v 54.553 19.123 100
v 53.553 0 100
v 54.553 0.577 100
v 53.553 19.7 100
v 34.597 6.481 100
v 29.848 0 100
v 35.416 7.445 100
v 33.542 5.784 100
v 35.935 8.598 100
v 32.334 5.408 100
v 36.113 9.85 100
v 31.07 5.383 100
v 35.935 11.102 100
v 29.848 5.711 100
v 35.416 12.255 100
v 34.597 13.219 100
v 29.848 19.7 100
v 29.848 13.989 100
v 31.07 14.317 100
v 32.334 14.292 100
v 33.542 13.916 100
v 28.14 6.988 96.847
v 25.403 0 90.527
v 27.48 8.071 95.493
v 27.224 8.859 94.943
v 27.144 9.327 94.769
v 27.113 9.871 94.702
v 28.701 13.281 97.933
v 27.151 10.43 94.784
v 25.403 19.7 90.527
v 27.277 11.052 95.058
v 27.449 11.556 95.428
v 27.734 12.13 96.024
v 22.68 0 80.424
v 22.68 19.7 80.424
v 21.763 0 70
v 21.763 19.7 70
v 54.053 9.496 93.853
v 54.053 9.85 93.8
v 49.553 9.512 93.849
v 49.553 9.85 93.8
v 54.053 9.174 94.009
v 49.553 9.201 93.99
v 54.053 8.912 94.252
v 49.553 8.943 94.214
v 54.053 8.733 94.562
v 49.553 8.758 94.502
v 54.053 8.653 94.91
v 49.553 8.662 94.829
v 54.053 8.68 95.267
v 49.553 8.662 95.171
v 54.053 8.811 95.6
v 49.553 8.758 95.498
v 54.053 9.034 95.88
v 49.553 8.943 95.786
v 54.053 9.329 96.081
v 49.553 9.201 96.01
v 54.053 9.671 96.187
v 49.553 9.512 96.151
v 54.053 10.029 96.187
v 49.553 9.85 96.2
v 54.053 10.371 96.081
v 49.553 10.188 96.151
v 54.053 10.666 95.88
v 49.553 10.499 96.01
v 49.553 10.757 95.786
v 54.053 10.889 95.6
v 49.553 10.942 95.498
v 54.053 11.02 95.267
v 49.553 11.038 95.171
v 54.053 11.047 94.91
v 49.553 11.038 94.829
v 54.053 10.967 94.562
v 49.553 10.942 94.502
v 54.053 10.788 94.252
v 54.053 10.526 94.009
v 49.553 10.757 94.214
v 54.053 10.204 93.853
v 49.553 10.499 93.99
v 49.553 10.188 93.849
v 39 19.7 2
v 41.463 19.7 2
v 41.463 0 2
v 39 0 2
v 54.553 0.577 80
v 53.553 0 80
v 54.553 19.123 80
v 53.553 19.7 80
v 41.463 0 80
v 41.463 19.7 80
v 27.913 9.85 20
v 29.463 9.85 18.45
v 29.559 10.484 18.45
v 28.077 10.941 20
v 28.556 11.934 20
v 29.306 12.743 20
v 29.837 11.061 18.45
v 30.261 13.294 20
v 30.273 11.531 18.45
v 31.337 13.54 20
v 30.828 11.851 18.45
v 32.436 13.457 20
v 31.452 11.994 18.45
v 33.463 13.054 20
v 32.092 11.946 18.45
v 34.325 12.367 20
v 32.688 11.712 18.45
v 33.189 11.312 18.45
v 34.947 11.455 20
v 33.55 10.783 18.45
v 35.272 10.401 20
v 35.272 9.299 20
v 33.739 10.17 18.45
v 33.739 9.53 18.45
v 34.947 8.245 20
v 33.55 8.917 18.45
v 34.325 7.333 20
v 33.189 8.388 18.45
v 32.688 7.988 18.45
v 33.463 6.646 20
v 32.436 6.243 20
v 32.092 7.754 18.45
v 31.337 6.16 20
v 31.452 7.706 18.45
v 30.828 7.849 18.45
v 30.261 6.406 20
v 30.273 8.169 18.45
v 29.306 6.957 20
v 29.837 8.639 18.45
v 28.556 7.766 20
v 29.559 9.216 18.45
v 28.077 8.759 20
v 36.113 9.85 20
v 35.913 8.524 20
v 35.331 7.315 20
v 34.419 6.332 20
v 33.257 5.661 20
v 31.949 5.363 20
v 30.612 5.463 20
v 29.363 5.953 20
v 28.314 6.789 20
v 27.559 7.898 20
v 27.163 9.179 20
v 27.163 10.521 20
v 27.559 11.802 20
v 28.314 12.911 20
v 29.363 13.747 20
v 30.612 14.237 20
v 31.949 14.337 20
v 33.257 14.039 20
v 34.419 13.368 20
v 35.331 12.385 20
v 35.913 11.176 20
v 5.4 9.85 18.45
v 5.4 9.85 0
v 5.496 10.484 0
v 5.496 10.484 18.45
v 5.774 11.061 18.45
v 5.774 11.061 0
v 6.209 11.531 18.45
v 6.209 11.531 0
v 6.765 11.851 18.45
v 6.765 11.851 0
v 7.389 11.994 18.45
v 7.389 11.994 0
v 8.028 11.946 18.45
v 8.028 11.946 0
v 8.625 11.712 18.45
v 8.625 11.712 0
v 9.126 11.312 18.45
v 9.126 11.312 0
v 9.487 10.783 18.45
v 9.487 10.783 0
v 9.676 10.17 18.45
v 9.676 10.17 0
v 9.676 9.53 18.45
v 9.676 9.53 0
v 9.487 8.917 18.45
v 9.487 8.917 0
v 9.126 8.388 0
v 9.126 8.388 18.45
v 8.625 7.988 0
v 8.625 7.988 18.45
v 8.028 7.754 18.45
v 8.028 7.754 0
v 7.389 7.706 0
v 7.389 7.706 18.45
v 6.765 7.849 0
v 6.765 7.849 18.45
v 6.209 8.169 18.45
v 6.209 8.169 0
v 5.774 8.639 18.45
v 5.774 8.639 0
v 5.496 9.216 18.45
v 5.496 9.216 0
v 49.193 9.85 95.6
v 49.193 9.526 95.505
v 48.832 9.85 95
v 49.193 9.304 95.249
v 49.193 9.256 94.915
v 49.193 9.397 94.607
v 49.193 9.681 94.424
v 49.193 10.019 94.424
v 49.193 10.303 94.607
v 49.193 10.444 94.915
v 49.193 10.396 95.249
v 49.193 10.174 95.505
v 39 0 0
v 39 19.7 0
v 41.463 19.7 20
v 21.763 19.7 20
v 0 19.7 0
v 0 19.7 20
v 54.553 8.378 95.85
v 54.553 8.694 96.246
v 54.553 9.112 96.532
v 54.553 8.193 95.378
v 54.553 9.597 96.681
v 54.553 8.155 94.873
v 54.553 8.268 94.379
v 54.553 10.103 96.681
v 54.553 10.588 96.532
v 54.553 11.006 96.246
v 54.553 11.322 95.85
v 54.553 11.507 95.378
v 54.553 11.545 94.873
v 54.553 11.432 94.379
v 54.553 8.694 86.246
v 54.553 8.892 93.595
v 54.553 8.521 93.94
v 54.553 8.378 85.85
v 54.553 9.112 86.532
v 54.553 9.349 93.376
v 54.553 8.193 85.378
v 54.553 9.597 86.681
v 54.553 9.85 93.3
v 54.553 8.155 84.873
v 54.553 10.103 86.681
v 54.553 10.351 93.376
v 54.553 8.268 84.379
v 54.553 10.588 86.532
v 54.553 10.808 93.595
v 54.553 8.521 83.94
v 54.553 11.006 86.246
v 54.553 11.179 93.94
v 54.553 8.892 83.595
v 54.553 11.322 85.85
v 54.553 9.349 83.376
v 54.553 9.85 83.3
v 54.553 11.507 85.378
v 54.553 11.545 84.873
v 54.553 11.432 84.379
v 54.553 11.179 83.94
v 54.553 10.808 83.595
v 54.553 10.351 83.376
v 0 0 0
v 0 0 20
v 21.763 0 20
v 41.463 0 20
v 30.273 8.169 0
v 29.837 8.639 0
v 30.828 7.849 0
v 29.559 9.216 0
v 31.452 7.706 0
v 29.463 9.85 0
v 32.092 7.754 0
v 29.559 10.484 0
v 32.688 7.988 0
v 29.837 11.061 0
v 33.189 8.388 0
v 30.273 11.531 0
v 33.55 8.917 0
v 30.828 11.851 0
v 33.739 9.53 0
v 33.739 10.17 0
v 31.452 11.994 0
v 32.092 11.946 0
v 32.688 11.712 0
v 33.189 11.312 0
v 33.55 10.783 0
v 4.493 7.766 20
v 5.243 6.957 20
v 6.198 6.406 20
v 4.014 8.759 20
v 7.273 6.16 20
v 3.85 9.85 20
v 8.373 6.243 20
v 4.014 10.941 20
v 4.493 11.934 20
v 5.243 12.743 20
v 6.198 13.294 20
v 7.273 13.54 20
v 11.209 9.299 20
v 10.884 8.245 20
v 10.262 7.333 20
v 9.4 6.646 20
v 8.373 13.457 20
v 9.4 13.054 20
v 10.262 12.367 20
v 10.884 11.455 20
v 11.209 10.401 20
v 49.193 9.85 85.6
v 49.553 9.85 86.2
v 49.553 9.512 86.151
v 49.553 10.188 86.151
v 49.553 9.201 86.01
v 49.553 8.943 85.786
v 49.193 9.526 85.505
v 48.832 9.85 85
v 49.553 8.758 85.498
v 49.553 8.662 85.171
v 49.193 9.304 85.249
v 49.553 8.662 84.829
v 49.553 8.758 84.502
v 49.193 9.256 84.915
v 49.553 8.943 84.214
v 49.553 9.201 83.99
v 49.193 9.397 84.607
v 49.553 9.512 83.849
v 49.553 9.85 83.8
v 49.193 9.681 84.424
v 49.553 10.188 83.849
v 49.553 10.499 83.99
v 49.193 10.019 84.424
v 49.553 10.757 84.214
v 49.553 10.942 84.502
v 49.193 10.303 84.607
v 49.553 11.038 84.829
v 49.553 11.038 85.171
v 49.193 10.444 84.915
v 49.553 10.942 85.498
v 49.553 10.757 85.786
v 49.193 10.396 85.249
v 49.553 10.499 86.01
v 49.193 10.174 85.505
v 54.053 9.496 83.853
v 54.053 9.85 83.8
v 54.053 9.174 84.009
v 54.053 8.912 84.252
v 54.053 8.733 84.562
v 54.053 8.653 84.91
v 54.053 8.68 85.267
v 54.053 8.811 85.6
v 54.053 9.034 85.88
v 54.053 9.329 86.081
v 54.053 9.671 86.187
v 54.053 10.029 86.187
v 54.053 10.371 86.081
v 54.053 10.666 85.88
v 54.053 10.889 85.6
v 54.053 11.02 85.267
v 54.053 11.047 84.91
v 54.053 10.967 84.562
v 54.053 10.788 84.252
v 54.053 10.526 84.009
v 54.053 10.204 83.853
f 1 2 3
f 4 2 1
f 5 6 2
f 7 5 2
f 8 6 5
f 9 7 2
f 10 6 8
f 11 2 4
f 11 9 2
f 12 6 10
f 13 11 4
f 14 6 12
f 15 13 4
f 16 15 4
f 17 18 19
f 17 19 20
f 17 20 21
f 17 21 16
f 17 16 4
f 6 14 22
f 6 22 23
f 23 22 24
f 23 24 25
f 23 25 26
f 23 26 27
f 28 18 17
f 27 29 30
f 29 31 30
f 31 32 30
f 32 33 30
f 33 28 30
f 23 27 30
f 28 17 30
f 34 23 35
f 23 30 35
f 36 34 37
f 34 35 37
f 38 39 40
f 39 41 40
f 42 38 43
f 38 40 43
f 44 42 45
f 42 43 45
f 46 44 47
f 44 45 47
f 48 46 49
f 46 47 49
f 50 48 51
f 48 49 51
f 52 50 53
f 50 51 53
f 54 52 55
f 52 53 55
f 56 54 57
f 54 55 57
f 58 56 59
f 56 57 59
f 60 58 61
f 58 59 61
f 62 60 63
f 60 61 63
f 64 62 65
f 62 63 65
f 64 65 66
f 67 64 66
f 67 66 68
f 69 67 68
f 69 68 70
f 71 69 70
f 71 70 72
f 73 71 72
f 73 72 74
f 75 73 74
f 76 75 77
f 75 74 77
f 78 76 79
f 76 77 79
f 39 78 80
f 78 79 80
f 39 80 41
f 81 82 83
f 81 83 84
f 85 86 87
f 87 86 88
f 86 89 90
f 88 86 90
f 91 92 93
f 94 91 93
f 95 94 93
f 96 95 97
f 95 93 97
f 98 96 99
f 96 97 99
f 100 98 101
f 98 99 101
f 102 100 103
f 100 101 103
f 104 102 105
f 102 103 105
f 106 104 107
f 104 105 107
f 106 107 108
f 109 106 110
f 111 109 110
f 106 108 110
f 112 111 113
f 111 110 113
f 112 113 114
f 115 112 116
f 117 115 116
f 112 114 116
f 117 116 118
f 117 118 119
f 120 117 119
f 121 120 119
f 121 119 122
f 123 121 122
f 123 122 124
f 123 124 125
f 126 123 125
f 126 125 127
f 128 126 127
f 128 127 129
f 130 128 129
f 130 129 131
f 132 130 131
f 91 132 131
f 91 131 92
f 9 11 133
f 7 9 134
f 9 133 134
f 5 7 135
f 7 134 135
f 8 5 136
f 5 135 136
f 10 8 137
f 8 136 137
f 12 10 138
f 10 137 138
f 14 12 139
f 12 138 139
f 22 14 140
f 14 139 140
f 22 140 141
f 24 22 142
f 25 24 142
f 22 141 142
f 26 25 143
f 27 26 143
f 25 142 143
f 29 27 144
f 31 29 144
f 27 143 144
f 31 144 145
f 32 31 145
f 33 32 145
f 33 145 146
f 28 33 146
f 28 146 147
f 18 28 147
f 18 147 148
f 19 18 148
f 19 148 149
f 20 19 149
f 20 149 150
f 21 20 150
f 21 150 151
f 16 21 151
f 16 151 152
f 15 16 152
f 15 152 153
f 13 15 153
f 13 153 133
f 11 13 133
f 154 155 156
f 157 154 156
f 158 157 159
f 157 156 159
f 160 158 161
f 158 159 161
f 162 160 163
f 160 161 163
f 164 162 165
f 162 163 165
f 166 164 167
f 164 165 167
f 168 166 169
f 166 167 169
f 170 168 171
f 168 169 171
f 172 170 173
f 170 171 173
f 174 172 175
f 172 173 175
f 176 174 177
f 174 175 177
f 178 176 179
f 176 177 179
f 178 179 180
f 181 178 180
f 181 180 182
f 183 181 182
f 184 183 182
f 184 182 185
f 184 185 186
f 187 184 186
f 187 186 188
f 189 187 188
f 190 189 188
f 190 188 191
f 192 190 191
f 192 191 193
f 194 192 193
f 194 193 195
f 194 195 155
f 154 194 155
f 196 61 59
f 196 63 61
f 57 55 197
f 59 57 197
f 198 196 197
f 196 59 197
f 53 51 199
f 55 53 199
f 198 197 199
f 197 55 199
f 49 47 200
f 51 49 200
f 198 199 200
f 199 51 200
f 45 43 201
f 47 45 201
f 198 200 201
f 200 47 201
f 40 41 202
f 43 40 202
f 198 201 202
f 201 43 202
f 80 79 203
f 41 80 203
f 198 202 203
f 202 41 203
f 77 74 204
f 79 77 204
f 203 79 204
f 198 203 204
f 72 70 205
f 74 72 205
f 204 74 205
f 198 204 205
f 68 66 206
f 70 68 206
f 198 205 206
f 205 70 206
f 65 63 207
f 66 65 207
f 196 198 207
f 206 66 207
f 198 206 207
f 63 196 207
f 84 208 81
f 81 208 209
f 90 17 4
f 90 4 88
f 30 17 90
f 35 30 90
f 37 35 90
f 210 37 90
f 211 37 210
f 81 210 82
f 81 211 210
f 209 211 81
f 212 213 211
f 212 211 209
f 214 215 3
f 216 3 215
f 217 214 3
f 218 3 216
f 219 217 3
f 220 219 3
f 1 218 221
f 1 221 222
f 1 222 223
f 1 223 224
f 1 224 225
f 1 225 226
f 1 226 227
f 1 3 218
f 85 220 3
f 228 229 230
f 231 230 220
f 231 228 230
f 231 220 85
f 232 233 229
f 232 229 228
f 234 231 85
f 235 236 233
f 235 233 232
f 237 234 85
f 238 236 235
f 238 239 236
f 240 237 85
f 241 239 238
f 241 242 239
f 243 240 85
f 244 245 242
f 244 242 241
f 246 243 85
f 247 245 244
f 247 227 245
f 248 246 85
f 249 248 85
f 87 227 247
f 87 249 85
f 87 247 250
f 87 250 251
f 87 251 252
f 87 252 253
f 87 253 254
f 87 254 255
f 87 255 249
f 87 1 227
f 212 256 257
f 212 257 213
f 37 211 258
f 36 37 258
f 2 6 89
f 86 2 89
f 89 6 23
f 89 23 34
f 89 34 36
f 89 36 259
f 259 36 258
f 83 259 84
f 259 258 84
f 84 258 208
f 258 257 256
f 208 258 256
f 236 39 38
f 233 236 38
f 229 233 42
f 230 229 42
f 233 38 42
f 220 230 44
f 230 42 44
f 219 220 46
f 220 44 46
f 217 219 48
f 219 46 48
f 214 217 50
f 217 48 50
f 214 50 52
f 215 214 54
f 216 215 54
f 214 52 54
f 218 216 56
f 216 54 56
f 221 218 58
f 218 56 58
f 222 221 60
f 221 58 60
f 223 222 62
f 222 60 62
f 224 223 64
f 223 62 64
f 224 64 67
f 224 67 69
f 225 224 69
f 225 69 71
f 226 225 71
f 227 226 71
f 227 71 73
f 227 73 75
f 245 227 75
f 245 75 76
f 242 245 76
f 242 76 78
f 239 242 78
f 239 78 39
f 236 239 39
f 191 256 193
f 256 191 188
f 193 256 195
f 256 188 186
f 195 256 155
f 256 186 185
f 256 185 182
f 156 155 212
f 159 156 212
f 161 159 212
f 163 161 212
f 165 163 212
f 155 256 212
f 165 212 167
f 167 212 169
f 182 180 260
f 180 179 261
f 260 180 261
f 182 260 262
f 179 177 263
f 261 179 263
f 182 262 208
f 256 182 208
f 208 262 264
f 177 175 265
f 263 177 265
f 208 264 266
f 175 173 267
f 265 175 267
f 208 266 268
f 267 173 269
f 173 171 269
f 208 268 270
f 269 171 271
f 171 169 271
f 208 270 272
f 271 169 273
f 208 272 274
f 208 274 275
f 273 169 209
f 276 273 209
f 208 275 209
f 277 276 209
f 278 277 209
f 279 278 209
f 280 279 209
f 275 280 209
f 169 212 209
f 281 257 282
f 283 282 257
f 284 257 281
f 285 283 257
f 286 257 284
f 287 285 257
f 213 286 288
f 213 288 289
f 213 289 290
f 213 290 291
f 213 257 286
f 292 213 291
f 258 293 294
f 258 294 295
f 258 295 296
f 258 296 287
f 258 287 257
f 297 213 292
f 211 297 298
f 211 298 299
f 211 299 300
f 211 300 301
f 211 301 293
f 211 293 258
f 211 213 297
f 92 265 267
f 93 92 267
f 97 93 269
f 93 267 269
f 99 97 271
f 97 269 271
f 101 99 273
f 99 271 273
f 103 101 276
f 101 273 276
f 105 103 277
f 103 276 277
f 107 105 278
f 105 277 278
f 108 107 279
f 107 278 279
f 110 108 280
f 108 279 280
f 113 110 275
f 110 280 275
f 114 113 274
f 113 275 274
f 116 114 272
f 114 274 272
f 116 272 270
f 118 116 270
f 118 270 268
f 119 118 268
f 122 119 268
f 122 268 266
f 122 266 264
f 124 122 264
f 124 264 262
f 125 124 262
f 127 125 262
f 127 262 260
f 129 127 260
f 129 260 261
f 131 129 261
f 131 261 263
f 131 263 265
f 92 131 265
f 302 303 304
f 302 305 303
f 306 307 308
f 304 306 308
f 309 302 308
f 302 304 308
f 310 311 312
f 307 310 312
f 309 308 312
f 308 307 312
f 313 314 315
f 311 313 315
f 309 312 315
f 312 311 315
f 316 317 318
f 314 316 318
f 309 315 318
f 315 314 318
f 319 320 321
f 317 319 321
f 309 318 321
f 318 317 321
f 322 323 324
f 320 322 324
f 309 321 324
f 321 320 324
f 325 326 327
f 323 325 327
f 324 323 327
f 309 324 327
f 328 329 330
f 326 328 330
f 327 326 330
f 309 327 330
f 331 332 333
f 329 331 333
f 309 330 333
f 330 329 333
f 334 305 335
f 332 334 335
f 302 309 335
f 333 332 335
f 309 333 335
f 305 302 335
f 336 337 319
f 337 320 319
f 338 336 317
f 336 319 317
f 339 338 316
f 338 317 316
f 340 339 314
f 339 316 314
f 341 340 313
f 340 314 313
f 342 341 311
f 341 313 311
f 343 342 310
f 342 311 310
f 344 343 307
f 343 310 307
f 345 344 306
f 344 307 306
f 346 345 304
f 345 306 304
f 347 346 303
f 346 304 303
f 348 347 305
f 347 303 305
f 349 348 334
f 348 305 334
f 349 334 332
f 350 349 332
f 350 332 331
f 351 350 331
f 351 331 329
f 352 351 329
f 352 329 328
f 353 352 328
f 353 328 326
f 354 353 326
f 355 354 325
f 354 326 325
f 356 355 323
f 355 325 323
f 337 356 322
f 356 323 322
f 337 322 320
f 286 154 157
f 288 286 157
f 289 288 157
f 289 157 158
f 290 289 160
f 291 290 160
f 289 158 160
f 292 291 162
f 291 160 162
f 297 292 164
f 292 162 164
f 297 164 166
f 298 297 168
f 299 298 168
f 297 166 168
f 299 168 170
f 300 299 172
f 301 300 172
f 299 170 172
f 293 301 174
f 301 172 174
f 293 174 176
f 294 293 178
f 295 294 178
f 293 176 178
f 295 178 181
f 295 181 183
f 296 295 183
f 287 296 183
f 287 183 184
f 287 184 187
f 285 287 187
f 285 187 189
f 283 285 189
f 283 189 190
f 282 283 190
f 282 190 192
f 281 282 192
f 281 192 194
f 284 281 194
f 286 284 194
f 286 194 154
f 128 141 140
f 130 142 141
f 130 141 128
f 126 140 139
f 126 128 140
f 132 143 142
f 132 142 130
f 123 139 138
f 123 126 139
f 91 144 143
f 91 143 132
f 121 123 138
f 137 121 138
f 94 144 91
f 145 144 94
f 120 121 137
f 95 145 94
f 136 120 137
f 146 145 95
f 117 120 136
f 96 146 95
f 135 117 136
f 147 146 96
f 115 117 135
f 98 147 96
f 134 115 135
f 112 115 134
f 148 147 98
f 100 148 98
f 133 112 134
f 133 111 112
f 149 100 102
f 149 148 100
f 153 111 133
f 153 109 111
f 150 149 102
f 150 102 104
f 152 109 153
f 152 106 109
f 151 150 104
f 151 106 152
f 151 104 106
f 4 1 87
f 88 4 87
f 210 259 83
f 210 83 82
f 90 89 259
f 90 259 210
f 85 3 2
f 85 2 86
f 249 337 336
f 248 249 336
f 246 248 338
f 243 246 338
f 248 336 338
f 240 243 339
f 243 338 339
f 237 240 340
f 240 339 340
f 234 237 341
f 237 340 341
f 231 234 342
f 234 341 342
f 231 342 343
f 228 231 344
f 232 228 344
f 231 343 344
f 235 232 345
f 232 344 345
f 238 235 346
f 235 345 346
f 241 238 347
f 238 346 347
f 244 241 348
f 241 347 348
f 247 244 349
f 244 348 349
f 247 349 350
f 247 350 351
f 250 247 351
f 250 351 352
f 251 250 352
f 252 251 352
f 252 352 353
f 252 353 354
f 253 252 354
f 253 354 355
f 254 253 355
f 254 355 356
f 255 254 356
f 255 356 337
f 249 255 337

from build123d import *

# Parameters (mm, degrees)
SCHIZZO1_W                             = 39
SCHIZZO1_H                             = 19.7
ESTRUSIONE_ESTRUSIONE1_DEPTH           = 20
FORO_SVASATO_PER_VITE_M4_1_D           = 4.3
FORO_SVASATO_PER_VITE_M4_1_DEPTH       = 20
FORO_SVASATO_PER_VITE_M4_1_CSINK_D     = 7.4
FORO_SVASATO_PER_VITE_M4_1_CSINK_ANGLE = 90
ESTRUSIONE_ESTRUSIONE4_DEPTH           = 80
SCHIZZO7_W                             = 2.463088349
SCHIZZO7_H                             = 19.7
ESTRUSIONE_ESTRUSIONE5_DEPTH           = 18
TAGLIO_ESTRUSIONE2_DEPTH               = 20.7
SCHIZZO17_W                            = 20
SCHIZZO17_H                            = 19.7
ESTRUSIONE_ESTRUSIONE7_DEPTH           = 13.09
SMUSSO1_SIZE                           = 1
SMUSSO1_SIZE2                          = 0.577350269
SMUSSO1_PART_2_SIZE                    = 1
SMUSSO1_PART_2_SIZE2                   = 0.577350269
FORO_SVASATO_PER_VITE_M2_1_D           = 2.4
FORO_SVASATO_PER_VITE_M2_1_DEPTH       = 5
FORO_SVASATO_PER_VITE_M2_1_CSINK_D     = 3.4
FORO_SVASATO_PER_VITE_M2_1_CSINK_ANGLE = 90
FORO_SVASATO_PER_VITE_M2_1_TIP         = 0.721032743


with BuildPart() as part:
    # Schizzo1 → Estrusione-Estrusione1 (new body)
    with BuildSketch(Plane.XY):
        with Locations((19.5, 9.85)):
            Rectangle(SCHIZZO1_W, SCHIZZO1_H)
    extrude(amount=ESTRUSIONE_ESTRUSIONE1_DEPTH)

    # Foro svasato per Vite M4-1
    with Locations(Plane(origin=(7.55, 9.85, 20), x_dir=(1, 0, 0), z_dir=(0, 0, 1))):
        with Locations((0, 0), (24.063088349, 0)):
            CounterSinkHole(FORO_SVASATO_PER_VITE_M4_1_D / 2, FORO_SVASATO_PER_VITE_M4_1_CSINK_D / 2, depth=FORO_SVASATO_PER_VITE_M4_1_DEPTH, counter_sink_angle=FORO_SVASATO_PER_VITE_M4_1_CSINK_ANGLE)

    # Schizzo2 → Estrusione-Estrusione4 (add)
    with BuildSketch(Plane.XY.offset(20)):
        with BuildLine():
            Line((21.763088349, 19.7), (21.763088349, 9.85))
            Line((21.763088349, 9.85), (27.113088349, 9.85))
            ThreePointArc((27.113088349, 9.85), (31.613088349, 14.35), (36.113088349, 9.85))
            Line((36.113088349, 9.85), (39, 9.85))
            Line((39, 9.85), (39, 19.7))
            Line((39, 19.7), (21.763088349, 19.7))
        make_face()
        with BuildLine():
            Line((27.113088349, 9.85), (21.763088349, 9.85))
            Line((21.763088349, 9.85), (21.763088349, 0))
            Line((21.763088349, 0), (39, 0))
            Line((39, 0), (39, 9.85))
            Line((39, 9.85), (36.113088349, 9.85))
            ThreePointArc((36.113088349, 9.85), (31.613088349, 5.35), (27.113088349, 9.85))
        make_face()
        Polygon((39, 9.85), (39, 0), (41.463088349, 0), (41.463088349, 19.7), (39, 19.7), align=None)
    extrude(amount=ESTRUSIONE_ESTRUSIONE4_DEPTH)

    # Schizzo7 → Estrusione-Estrusione5 (add)
    with BuildSketch(Plane(origin=(0, 0, 20), x_dir=(-1, 0, 0), z_dir=(0, 0, -1))):
        with Locations((-40.231544175, 9.85)):
            Rectangle(SCHIZZO7_W, SCHIZZO7_H)
    extrude(amount=ESTRUSIONE_ESTRUSIONE5_DEPTH)

    # Schizzo9 → Taglio-Estrusione2 (cut, through all)
    with BuildSketch(Plane(origin=(0, 19.7, 0), x_dir=(1, 0, 0), z_dir=(0, 1, 0))):
        with BuildLine():
            Line((21.763088349, -70), (21.763088349, -100))
            Line((21.763088349, -100), (29.848264897, -100))
            ThreePointArc((29.848264897, -100), (23.81981051, -85.535202604), (21.763088349, -70))
        make_face()
    extrude(amount=-TAGLIO_ESTRUSIONE2_DEPTH, mode=Mode.SUBTRACT)

    # Schizzo17 → Estrusione-Estrusione7 (add)
    with BuildSketch(Plane(origin=(41.463088349, 0, 0), x_dir=(0, 0, -1), z_dir=(1, 0, 0))):
        with Locations((-90, 9.85)):
            Rectangle(SCHIZZO17_W, SCHIZZO17_H)
    extrude(amount=ESTRUSIONE_ESTRUSIONE7_DEPTH)

    # Smusso1
    smusso1_edges = [part.edges().sort_by_distance(p)[0] for p in [
        (54.553088349, 0, 90),
    ]]
    smusso1_side = [part.faces().sort_by_distance(p)[0] for p in [
        (29.991928904, 0, 46.112902696),
    ]]
    chamfer(smusso1_edges, length=SMUSSO1_SIZE, length2=SMUSSO1_SIZE2, reference=smusso1_side[0])

    # Smusso1 part 2
    smusso1_part_2_edges = [part.edges().sort_by_distance(p)[0] for p in [
        (54.553088349, 19.7, 90),
    ]]
    smusso1_part_2_side = [part.faces().sort_by_distance(p)[0] for p in [
        (29.991928904, 19.7, 46.112902696),
    ]]
    chamfer(smusso1_part_2_edges, length=SMUSSO1_PART_2_SIZE, length2=SMUSSO1_PART_2_SIZE2, reference=smusso1_part_2_side[0])

    # Foro svasato per Vite M2-1
    with Locations(Plane(origin=(54.553088349, 9.85, 95), x_dir=(0, 0, 1), z_dir=(1, 0, 0))):
        with Locations((0, 0), (-10, 0)):
            CounterSinkHole(FORO_SVASATO_PER_VITE_M2_1_D / 2, FORO_SVASATO_PER_VITE_M2_1_CSINK_D / 2, depth=FORO_SVASATO_PER_VITE_M2_1_DEPTH, counter_sink_angle=FORO_SVASATO_PER_VITE_M2_1_CSINK_ANGLE)
            with Locations((0, 0, -(FORO_SVASATO_PER_VITE_M2_1_DEPTH + FORO_SVASATO_PER_VITE_M2_1_TIP / 2))):  # 118° drill point
                Cone(0, FORO_SVASATO_PER_VITE_M2_1_D / 2, FORO_SVASATO_PER_VITE_M2_1_TIP, mode=Mode.SUBTRACT)


solid = part.part
